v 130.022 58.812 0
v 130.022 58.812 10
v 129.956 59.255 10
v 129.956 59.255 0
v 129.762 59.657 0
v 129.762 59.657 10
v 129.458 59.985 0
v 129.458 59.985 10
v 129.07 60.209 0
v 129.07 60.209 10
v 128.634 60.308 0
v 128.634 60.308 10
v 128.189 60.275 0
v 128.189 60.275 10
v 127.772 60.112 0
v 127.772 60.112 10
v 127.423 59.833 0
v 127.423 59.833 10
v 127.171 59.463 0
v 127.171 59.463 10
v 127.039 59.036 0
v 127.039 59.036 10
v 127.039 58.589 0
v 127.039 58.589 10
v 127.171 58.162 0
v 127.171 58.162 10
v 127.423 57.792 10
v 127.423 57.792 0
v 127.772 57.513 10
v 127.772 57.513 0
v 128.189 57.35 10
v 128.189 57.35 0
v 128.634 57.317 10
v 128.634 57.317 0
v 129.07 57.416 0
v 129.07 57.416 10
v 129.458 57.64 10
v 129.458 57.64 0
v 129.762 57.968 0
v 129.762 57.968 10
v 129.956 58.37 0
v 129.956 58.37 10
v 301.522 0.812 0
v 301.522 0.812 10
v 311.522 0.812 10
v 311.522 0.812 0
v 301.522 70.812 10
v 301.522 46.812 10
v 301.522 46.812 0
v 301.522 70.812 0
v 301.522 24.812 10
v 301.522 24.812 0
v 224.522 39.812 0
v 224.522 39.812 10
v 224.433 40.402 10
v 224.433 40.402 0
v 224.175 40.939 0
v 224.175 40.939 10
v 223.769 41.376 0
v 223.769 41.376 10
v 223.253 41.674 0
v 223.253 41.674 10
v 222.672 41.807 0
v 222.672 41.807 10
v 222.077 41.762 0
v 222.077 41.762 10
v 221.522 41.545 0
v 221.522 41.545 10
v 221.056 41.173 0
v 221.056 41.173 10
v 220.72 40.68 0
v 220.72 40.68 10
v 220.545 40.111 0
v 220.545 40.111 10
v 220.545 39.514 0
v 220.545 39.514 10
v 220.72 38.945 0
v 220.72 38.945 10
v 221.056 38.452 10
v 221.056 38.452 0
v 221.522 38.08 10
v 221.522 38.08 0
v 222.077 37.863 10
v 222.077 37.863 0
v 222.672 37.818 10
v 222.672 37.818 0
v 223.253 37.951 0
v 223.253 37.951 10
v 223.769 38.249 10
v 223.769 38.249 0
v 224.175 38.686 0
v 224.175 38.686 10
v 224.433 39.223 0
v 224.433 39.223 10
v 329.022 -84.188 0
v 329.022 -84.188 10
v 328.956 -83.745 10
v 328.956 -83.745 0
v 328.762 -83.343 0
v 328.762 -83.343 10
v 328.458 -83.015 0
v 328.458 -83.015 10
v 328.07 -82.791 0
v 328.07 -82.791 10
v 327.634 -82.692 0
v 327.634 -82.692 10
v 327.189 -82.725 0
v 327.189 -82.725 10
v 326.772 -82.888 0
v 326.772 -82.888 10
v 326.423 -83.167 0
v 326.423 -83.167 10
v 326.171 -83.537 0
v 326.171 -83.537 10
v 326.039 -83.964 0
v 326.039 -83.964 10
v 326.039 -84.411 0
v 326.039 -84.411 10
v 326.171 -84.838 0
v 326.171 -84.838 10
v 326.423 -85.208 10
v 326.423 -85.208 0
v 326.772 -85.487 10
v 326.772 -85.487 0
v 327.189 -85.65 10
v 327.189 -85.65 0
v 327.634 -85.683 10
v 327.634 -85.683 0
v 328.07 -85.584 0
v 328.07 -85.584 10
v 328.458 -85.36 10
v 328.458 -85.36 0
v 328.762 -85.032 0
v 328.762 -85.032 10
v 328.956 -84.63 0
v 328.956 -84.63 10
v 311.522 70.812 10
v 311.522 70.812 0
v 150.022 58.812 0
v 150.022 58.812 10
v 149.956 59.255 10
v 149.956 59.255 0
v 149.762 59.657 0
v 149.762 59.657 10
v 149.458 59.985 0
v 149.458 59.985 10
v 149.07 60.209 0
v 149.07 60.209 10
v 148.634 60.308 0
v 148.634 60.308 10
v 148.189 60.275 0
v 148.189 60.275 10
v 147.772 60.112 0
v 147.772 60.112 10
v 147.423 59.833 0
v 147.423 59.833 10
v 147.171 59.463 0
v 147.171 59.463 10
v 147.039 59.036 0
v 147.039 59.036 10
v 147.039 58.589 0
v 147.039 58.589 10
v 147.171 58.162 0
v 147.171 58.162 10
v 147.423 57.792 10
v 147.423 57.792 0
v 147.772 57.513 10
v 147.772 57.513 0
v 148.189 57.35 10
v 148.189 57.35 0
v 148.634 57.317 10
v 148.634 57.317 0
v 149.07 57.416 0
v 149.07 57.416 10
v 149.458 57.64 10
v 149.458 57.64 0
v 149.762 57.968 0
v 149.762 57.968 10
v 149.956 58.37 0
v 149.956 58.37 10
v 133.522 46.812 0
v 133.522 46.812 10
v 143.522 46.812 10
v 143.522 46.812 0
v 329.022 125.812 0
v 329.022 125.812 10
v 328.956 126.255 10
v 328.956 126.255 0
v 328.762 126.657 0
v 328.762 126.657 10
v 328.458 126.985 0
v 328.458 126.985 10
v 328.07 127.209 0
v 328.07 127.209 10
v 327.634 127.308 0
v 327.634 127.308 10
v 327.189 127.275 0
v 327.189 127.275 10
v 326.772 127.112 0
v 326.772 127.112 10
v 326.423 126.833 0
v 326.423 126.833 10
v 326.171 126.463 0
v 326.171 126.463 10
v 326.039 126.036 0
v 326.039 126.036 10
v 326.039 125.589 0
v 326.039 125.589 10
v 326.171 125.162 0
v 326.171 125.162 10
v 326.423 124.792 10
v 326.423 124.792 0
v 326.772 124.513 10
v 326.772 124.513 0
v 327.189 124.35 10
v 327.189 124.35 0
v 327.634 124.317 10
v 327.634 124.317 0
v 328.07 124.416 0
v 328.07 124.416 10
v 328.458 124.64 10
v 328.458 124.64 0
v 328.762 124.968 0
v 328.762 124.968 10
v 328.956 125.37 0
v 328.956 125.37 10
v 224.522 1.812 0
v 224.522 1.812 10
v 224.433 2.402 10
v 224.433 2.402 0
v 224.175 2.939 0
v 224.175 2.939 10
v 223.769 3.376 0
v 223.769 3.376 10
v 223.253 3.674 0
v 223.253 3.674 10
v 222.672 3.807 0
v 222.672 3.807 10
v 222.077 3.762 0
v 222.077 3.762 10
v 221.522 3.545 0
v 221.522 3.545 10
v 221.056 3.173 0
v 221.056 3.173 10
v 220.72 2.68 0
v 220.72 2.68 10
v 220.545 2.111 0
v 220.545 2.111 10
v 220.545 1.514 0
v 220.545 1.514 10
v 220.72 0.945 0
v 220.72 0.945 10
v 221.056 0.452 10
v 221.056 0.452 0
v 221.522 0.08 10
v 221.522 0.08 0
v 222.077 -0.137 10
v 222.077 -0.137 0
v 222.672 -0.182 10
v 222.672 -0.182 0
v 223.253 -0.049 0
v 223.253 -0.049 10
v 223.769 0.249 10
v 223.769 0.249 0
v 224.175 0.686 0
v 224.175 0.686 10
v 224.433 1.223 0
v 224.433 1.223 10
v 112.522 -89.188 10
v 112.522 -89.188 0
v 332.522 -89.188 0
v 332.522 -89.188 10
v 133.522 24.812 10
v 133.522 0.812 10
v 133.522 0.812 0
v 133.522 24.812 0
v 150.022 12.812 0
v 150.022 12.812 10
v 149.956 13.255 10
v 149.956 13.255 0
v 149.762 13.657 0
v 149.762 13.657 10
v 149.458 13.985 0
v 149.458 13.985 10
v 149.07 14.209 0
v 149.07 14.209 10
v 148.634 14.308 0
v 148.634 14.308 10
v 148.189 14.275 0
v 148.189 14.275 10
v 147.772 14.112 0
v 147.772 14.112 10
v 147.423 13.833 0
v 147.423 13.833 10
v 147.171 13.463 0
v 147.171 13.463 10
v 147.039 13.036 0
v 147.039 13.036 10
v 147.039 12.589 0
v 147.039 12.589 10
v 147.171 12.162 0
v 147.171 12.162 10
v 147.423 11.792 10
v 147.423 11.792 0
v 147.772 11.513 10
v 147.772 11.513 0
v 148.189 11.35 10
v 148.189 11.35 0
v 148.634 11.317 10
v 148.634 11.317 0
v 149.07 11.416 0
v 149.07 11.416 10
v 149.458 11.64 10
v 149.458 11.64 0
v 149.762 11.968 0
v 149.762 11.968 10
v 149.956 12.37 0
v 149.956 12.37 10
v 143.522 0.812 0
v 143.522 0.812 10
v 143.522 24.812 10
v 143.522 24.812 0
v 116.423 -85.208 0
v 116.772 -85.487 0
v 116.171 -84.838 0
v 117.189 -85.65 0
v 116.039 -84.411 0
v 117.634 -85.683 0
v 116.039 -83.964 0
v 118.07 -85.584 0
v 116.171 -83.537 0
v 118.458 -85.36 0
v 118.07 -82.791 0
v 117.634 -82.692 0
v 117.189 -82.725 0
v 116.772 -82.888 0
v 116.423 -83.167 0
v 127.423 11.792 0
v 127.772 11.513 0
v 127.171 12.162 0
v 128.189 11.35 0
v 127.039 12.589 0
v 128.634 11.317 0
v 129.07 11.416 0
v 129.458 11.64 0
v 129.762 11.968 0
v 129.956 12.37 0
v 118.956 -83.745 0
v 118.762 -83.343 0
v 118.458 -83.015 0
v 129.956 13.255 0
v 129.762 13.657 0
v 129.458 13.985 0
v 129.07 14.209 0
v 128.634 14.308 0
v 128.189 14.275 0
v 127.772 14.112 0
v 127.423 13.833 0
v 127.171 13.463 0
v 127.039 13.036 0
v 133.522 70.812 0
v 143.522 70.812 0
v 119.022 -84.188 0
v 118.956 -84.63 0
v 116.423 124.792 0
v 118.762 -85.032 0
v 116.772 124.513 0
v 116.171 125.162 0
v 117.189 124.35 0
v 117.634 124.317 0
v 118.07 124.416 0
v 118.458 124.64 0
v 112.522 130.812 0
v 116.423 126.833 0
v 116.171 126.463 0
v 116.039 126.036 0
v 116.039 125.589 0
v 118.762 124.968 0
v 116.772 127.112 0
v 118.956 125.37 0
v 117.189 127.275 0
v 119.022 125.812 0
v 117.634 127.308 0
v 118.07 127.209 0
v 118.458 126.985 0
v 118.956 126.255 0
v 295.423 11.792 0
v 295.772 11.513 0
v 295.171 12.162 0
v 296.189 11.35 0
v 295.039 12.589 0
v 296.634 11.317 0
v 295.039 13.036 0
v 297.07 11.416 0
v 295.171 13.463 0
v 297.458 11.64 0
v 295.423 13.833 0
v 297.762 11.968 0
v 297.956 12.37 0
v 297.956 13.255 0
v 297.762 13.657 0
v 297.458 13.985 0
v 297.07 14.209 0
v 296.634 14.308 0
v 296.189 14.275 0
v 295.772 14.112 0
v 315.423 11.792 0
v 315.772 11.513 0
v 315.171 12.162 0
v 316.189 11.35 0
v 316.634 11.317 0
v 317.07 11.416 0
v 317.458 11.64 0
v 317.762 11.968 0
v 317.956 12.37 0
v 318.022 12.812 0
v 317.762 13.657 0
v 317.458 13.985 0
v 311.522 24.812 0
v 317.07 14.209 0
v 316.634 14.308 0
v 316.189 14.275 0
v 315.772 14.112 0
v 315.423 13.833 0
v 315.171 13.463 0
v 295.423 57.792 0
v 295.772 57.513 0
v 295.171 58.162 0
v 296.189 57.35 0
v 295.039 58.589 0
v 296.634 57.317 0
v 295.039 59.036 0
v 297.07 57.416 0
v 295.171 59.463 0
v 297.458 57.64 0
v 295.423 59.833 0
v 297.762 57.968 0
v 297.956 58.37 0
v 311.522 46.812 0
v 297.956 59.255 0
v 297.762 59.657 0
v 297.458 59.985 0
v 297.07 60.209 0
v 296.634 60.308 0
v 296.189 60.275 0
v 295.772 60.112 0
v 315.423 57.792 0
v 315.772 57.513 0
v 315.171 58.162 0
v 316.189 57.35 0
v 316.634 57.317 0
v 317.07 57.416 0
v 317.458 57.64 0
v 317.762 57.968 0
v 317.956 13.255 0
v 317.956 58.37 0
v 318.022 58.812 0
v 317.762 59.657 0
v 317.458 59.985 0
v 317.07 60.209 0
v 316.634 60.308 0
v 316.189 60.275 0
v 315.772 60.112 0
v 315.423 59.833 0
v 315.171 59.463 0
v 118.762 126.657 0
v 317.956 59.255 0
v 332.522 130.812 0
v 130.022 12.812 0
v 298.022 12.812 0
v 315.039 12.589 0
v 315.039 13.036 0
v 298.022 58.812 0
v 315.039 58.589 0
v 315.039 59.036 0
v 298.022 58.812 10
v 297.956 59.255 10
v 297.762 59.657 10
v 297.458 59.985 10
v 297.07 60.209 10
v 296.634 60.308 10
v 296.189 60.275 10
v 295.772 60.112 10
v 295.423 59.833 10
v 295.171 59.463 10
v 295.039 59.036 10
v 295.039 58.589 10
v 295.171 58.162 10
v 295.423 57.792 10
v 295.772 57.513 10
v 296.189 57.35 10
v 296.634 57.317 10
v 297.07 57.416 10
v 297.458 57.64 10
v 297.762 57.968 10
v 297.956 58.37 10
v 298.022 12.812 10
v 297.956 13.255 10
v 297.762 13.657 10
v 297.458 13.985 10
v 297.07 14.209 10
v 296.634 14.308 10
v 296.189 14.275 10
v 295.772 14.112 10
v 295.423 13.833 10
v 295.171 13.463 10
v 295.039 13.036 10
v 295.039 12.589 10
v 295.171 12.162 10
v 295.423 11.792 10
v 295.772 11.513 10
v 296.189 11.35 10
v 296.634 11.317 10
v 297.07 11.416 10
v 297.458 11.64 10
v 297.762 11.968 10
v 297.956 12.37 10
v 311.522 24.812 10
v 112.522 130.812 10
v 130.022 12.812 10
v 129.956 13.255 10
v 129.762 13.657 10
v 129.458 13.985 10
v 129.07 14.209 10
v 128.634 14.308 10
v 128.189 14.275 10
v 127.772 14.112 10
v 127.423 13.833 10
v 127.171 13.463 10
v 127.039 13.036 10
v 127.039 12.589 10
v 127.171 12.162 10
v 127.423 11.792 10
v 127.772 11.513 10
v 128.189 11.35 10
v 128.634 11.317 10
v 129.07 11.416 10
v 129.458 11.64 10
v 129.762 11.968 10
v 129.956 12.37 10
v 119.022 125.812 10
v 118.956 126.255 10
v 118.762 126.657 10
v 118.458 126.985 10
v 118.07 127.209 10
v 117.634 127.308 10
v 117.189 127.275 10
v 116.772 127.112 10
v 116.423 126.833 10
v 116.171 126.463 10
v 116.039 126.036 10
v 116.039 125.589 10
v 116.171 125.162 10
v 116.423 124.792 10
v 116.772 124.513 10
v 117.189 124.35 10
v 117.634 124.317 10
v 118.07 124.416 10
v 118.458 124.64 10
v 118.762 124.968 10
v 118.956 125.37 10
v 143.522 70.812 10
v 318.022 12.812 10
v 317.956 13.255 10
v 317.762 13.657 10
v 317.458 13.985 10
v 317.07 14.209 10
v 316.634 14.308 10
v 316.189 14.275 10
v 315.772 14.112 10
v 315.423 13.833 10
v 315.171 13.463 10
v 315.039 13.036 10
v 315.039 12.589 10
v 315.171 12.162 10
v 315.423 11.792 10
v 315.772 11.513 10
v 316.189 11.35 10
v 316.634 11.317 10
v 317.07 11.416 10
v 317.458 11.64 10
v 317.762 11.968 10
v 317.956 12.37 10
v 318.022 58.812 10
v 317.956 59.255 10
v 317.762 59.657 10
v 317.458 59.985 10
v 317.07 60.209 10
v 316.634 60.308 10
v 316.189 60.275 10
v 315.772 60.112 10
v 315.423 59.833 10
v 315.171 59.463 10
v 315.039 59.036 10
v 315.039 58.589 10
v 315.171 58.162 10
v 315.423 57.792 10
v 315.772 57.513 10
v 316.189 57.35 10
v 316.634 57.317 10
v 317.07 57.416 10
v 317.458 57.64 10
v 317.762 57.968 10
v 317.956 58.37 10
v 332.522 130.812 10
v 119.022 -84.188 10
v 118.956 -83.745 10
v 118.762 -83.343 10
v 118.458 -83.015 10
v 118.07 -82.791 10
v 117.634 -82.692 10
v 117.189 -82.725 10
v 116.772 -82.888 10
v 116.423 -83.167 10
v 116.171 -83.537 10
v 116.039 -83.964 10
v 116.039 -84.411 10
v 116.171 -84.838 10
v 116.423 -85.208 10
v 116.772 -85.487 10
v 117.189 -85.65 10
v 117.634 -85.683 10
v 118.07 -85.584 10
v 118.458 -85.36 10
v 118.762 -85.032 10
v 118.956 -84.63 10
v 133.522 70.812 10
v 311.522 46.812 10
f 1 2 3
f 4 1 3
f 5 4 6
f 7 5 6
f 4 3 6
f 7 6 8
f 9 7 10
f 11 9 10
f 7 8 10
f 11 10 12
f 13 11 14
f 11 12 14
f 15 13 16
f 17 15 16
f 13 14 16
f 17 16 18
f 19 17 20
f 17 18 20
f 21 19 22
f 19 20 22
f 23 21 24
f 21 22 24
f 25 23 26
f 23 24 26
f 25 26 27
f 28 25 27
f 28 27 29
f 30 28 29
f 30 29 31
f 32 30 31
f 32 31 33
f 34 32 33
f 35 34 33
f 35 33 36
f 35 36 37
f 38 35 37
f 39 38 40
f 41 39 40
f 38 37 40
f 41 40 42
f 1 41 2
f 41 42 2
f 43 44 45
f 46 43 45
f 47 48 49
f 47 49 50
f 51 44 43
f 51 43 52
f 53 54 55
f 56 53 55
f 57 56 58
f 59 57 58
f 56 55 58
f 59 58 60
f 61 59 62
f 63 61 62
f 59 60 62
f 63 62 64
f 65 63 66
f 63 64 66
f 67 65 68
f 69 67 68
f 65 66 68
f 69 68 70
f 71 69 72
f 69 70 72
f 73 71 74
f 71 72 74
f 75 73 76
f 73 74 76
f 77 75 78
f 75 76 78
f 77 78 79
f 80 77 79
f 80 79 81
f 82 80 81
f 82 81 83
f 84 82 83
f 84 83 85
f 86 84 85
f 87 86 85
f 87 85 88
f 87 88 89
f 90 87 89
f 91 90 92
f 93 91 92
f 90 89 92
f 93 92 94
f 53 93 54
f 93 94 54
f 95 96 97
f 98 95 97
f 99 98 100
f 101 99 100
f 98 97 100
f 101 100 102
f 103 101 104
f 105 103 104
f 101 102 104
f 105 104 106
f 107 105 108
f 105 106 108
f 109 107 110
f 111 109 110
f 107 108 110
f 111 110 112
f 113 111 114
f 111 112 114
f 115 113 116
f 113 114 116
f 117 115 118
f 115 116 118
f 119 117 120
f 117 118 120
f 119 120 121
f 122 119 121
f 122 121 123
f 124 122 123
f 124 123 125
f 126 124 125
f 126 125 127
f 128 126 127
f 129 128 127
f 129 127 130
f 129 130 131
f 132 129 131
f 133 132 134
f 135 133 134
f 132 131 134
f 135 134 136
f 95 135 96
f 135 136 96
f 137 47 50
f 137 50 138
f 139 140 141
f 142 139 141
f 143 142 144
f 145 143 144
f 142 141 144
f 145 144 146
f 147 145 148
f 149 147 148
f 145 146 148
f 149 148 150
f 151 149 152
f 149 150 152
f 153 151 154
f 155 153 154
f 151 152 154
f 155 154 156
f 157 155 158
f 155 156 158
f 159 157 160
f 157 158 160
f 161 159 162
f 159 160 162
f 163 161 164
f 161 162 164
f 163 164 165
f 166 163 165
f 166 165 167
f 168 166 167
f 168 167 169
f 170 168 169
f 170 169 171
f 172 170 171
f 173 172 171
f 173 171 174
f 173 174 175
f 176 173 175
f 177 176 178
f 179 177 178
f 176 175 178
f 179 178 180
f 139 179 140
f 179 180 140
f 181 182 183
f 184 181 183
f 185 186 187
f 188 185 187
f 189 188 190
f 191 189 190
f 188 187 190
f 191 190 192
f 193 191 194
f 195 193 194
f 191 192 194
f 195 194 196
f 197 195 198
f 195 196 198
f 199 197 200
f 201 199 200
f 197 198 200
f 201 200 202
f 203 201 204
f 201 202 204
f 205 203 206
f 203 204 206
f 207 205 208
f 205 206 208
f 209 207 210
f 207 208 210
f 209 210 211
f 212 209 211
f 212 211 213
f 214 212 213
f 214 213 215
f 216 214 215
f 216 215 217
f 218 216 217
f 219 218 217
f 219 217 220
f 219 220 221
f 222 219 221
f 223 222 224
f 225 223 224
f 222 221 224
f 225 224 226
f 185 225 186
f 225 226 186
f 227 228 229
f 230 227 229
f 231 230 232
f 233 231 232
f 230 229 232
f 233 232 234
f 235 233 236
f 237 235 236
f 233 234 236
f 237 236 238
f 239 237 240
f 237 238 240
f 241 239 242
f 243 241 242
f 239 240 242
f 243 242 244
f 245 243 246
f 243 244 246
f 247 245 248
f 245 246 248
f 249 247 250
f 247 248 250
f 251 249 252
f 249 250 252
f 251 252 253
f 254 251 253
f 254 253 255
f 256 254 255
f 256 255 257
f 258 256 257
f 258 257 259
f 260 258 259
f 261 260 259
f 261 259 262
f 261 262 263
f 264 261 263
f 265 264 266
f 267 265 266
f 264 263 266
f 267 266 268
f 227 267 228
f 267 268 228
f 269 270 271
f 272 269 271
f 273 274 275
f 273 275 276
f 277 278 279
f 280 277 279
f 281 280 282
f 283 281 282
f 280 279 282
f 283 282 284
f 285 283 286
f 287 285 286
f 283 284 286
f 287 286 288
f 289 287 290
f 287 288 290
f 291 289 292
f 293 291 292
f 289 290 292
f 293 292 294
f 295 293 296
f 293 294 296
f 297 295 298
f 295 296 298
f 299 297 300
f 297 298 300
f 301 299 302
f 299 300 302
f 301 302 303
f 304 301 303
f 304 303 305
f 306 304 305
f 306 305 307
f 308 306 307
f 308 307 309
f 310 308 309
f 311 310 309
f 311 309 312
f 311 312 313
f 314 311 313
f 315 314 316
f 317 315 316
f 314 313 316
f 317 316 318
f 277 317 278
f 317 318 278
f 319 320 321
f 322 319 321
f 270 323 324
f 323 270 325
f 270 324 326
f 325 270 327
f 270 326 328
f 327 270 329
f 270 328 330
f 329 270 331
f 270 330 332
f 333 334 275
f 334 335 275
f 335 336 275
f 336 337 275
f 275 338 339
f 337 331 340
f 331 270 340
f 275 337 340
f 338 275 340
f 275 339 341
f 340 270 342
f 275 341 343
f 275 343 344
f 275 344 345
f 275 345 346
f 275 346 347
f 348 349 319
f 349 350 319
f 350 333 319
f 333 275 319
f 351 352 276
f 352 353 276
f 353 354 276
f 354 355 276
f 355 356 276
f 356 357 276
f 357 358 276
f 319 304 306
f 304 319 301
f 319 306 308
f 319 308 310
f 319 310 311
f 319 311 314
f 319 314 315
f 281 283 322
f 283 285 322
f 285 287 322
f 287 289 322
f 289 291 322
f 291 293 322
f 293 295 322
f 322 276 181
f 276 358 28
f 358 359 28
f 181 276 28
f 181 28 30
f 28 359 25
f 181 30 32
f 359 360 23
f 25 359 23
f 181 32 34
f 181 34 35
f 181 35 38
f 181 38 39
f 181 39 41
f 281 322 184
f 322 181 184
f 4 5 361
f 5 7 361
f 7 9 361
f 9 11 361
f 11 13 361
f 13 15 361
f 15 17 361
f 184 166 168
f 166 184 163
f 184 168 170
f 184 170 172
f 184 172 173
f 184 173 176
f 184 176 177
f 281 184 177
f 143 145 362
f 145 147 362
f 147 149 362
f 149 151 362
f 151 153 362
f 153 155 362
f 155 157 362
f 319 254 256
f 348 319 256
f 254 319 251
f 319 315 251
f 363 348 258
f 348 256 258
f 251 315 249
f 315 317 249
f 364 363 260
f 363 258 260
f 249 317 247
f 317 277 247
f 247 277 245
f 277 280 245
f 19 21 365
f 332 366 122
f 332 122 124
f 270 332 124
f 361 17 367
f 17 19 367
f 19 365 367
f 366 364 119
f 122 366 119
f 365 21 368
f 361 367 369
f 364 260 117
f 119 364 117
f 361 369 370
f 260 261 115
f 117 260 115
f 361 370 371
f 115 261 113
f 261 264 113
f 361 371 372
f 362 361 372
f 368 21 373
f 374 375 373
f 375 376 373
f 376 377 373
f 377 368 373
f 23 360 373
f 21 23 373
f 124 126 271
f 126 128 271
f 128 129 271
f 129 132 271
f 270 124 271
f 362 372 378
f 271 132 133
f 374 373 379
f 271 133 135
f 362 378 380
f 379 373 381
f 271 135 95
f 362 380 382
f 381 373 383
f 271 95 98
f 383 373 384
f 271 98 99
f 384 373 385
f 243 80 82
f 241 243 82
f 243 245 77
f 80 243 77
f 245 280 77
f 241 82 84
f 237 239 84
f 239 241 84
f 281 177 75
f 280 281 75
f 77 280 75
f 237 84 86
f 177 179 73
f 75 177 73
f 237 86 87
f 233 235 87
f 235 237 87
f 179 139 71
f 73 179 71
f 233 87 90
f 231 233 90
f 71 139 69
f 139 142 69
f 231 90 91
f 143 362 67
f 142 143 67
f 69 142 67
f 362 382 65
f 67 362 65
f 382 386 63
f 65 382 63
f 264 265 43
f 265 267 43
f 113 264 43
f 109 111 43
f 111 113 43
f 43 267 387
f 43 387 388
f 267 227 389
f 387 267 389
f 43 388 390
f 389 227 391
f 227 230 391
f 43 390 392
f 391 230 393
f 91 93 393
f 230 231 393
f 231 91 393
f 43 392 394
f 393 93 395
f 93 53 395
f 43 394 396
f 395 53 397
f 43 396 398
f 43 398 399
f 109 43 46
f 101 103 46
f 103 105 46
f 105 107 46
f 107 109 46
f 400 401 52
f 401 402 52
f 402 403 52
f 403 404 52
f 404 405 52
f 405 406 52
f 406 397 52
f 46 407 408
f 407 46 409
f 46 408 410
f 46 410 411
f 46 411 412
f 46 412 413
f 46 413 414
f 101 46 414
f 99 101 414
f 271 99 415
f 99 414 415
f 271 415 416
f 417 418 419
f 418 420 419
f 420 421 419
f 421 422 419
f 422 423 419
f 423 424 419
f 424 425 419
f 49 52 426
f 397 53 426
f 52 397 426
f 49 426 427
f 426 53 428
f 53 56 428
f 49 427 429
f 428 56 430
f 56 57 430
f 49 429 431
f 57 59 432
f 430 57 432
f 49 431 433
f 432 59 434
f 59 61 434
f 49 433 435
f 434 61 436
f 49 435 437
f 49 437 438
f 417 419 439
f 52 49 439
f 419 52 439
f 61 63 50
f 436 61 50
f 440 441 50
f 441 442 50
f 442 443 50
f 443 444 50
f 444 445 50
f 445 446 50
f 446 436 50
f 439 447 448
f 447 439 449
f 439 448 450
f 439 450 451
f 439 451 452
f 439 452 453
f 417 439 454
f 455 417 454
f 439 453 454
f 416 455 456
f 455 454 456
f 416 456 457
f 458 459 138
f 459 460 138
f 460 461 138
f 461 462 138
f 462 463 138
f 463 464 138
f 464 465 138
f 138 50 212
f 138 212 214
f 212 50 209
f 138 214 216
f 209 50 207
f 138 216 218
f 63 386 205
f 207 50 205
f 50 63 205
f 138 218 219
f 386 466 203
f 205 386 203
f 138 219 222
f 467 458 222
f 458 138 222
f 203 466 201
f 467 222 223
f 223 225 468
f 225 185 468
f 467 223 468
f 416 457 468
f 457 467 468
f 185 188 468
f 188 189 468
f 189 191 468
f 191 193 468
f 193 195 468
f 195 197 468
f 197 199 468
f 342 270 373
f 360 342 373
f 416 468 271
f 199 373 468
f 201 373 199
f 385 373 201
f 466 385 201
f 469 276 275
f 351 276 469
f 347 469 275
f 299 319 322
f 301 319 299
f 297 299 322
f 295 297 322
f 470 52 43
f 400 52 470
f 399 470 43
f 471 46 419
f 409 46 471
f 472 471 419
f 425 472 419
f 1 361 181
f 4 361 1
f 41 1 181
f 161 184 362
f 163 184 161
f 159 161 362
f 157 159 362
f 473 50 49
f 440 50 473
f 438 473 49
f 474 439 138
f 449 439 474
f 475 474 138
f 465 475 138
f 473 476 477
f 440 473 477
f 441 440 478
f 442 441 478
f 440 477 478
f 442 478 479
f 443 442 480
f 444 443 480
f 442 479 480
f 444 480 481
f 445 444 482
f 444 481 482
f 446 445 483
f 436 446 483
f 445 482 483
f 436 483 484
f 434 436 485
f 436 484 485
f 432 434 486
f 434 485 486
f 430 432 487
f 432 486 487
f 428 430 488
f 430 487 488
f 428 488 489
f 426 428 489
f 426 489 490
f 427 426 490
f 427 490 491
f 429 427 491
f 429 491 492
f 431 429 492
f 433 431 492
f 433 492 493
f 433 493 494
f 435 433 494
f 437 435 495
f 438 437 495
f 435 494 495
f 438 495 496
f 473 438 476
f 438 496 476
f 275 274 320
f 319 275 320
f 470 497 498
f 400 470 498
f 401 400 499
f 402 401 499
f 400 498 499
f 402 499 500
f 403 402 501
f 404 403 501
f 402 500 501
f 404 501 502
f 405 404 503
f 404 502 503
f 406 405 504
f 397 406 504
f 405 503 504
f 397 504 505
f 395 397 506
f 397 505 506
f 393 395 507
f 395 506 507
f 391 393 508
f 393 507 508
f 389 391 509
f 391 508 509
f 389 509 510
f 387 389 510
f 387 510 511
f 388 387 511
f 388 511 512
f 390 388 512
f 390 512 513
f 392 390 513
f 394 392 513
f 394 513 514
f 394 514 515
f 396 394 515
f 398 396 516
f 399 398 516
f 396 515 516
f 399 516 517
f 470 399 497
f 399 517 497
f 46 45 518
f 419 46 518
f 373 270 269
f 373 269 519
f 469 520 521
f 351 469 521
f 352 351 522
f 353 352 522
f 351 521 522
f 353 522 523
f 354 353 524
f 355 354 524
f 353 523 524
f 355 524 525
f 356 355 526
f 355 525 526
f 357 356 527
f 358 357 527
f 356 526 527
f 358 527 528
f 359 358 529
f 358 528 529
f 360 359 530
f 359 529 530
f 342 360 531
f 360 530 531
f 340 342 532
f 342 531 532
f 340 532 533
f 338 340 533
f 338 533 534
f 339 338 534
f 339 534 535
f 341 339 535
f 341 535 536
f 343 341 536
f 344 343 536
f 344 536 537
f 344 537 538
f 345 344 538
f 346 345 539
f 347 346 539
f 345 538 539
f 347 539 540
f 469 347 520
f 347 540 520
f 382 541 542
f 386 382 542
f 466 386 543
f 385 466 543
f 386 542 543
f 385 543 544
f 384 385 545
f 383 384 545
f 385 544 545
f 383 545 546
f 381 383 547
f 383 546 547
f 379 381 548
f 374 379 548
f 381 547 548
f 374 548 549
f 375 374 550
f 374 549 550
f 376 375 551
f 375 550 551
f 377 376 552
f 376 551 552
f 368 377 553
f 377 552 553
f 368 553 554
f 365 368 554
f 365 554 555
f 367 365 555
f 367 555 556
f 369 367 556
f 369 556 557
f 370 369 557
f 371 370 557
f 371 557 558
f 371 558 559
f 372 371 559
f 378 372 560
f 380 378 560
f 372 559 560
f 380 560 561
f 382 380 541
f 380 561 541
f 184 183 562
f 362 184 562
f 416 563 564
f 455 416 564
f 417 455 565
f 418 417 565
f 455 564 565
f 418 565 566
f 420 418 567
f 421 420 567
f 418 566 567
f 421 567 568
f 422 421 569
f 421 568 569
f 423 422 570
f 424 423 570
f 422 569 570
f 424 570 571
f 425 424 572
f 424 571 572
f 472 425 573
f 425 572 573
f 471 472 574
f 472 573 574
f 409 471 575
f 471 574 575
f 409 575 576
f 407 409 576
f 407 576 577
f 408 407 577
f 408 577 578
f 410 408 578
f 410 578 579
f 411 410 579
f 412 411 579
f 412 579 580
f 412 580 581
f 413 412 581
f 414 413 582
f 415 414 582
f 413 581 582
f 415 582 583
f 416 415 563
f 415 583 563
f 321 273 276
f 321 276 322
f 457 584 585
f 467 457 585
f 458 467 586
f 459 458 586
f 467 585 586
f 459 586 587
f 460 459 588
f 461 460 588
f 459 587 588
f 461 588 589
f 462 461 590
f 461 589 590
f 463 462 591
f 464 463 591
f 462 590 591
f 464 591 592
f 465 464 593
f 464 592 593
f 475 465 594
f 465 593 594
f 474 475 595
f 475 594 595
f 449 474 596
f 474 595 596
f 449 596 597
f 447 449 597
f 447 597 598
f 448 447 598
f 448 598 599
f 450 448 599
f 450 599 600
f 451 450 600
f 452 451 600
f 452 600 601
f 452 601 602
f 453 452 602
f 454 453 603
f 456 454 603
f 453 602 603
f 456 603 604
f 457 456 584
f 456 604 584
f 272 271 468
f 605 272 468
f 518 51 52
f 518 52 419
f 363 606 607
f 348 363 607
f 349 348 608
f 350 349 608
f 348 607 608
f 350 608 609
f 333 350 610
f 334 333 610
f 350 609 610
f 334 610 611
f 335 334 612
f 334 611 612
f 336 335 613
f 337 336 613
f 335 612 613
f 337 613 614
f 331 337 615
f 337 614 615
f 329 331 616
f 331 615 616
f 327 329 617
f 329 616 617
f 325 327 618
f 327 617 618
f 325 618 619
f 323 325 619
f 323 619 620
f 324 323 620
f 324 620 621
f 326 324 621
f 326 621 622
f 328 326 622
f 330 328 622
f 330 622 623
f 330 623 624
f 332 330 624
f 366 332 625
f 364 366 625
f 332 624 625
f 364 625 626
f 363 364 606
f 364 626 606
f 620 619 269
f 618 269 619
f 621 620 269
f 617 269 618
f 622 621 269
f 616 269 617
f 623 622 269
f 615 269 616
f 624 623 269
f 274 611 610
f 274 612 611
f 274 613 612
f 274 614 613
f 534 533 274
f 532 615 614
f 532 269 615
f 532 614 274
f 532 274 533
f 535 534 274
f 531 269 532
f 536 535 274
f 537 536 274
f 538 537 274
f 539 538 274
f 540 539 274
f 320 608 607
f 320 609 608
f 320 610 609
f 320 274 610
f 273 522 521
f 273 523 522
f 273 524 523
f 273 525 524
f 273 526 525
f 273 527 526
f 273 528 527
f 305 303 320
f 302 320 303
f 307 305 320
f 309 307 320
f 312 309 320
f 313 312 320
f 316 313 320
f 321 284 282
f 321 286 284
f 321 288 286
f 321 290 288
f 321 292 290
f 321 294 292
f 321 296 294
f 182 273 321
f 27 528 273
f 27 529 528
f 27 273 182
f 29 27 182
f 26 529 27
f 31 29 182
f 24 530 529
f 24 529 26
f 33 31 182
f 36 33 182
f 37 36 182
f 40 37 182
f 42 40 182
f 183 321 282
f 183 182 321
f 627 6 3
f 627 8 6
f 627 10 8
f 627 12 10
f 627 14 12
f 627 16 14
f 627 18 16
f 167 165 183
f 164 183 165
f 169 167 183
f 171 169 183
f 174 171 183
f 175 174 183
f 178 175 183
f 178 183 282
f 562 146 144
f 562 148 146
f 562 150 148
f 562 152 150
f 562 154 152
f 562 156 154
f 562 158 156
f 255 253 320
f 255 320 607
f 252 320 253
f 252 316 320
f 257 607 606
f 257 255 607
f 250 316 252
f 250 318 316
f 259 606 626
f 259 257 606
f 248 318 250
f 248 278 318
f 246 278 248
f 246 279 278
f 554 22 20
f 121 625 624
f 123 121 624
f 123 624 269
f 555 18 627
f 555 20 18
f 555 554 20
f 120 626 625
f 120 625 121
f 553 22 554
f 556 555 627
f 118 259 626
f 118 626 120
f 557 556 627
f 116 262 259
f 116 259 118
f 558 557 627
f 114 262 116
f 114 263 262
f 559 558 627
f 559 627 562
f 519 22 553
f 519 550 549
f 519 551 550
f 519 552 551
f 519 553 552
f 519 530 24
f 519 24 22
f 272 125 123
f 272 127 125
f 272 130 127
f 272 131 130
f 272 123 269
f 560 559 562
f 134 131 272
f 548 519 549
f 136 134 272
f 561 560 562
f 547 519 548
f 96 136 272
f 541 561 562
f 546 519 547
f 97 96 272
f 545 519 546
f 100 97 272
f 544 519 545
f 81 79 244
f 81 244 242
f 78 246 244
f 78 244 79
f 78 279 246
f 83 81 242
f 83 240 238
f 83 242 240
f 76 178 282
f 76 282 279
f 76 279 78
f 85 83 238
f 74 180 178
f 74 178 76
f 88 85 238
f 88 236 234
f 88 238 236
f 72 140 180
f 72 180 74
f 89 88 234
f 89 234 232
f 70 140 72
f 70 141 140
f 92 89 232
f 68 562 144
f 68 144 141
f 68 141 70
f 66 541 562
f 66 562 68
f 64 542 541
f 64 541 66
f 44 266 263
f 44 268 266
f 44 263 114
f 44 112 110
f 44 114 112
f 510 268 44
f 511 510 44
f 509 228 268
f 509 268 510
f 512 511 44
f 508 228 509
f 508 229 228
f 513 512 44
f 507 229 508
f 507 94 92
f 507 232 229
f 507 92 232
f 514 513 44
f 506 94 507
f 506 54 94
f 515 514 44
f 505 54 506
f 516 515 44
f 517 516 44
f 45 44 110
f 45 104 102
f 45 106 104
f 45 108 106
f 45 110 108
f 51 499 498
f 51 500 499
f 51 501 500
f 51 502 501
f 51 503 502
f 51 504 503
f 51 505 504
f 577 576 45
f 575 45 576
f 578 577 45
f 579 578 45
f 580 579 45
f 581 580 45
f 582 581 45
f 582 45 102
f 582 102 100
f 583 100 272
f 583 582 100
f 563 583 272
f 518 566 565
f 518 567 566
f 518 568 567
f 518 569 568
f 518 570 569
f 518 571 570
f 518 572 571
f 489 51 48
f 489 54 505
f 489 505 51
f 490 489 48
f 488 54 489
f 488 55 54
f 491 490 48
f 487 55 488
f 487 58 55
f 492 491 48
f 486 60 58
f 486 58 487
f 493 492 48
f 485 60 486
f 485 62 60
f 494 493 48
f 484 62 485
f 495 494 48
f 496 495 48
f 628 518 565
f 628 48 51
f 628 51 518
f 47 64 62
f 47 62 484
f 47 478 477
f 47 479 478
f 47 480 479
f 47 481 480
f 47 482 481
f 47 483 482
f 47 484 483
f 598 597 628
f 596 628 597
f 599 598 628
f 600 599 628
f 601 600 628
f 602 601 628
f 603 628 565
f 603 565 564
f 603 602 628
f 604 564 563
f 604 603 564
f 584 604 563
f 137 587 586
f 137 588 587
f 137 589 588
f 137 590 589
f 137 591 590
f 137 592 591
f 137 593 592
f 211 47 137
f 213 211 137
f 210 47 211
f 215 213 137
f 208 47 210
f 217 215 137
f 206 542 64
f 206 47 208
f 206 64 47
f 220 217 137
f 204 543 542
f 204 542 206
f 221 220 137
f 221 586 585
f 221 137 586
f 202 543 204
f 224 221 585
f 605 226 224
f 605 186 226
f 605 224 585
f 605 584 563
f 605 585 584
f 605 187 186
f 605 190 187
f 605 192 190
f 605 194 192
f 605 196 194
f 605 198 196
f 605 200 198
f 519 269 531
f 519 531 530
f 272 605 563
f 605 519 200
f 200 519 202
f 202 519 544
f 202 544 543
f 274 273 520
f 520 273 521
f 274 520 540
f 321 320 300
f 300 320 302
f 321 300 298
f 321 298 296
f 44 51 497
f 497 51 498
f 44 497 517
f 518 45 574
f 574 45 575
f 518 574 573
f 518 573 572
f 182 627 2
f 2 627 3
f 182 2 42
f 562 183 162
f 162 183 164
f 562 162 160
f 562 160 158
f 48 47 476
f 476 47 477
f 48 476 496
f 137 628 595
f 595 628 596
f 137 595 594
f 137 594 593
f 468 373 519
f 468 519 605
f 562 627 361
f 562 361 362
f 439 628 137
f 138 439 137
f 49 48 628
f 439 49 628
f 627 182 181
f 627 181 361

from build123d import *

# Parameters (mm, degrees)
SKETCH2_W           = 220
SKETCH2_H           = 220
BOSS_EXTRUDE2_DEPTH = 10
SKETCH3_R           = 1.5
CUT_EXTRUDE2_DEPTH  = 10
SKETCH4_R           = 1.5
SKETCH4_W           = 10
SKETCH4_H           = 24
CUT_EXTRUDE3_DEPTH  = 10
SKETCH6_R           = 2
CUT_EXTRUDE4_DEPTH  = 10


with BuildPart() as part:
    # Sketch2 → Boss-Extrude2 (new body)
    with BuildSketch(Plane.XY):
        with Locations((222.522330277, 20.812483699)):
            Rectangle(SKETCH2_W, SKETCH2_H)
    extrude(amount=BOSS_EXTRUDE2_DEPTH)

    # Sketch3 → Cut-Extrude2 (cut)
    with BuildSketch(Plane.XY.offset(10)):
        with Locations((117.522330277, 125.812483699)):
            Circle(SKETCH3_R)
        with Locations((117.522330277, -84.187516301)):
            Circle(SKETCH3_R)
        with Locations((327.522330277, -84.187516301)):
            Circle(SKETCH3_R)
        with Locations((327.522330277, 125.812483699)):
            Circle(SKETCH3_R)
    extrude(amount=-CUT_EXTRUDE2_DEPTH, mode=Mode.SUBTRACT)

    # Sketch4 → Cut-Extrude3 (cut)
    with BuildSketch(Plane.XY.offset(10)):
        with Locations((128.522330277, 58.812483699)):
            Circle(SKETCH4_R)
        with Locations((148.522330277, 58.812483699)):
            Circle(SKETCH4_R)
        with Locations((128.522330277, 12.812483699)):
            Circle(SKETCH4_R)
        with Locations((148.522330277, 12.812483699)):
            Circle(SKETCH4_R)
        with Locations((296.522330277, 12.812483699)):
            Circle(SKETCH4_R)
        with Locations((316.522330277, 12.812483699)):
            Circle(SKETCH4_R)
        with Locations((296.522330277, 58.812483699)):
            Circle(SKETCH4_R)
        with Locations((316.522330277, 58.812483699)):
            Circle(SKETCH4_R)
        with Locations((138.522330277, 58.812483699)):
            Rectangle(SKETCH4_W, SKETCH4_H)
        with Locations((138.522330277, 12.812483699)):
            Rectangle(SKETCH4_W, SKETCH4_H)
        with Locations((306.522330277, 58.812483699)):
            Rectangle(SKETCH4_W, SKETCH4_H)
        with Locations((306.522330277, 12.812483699)):
            Rectangle(SKETCH4_W, SKETCH4_H)
    extrude(amount=-CUT_EXTRUDE3_DEPTH, mode=Mode.SUBTRACT)

    # Sketch6 → Cut-Extrude4 (cut)
    with BuildSketch(Plane.XY.offset(10)):
        with Locations((222.522330277, 39.812483699)):
            Circle(SKETCH6_R)
        with Locations((222.522330277, 1.812483699)):
            Circle(SKETCH6_R)
    extrude(amount=-CUT_EXTRUDE4_DEPTH, mode=Mode.SUBTRACT)


solid = part.part
